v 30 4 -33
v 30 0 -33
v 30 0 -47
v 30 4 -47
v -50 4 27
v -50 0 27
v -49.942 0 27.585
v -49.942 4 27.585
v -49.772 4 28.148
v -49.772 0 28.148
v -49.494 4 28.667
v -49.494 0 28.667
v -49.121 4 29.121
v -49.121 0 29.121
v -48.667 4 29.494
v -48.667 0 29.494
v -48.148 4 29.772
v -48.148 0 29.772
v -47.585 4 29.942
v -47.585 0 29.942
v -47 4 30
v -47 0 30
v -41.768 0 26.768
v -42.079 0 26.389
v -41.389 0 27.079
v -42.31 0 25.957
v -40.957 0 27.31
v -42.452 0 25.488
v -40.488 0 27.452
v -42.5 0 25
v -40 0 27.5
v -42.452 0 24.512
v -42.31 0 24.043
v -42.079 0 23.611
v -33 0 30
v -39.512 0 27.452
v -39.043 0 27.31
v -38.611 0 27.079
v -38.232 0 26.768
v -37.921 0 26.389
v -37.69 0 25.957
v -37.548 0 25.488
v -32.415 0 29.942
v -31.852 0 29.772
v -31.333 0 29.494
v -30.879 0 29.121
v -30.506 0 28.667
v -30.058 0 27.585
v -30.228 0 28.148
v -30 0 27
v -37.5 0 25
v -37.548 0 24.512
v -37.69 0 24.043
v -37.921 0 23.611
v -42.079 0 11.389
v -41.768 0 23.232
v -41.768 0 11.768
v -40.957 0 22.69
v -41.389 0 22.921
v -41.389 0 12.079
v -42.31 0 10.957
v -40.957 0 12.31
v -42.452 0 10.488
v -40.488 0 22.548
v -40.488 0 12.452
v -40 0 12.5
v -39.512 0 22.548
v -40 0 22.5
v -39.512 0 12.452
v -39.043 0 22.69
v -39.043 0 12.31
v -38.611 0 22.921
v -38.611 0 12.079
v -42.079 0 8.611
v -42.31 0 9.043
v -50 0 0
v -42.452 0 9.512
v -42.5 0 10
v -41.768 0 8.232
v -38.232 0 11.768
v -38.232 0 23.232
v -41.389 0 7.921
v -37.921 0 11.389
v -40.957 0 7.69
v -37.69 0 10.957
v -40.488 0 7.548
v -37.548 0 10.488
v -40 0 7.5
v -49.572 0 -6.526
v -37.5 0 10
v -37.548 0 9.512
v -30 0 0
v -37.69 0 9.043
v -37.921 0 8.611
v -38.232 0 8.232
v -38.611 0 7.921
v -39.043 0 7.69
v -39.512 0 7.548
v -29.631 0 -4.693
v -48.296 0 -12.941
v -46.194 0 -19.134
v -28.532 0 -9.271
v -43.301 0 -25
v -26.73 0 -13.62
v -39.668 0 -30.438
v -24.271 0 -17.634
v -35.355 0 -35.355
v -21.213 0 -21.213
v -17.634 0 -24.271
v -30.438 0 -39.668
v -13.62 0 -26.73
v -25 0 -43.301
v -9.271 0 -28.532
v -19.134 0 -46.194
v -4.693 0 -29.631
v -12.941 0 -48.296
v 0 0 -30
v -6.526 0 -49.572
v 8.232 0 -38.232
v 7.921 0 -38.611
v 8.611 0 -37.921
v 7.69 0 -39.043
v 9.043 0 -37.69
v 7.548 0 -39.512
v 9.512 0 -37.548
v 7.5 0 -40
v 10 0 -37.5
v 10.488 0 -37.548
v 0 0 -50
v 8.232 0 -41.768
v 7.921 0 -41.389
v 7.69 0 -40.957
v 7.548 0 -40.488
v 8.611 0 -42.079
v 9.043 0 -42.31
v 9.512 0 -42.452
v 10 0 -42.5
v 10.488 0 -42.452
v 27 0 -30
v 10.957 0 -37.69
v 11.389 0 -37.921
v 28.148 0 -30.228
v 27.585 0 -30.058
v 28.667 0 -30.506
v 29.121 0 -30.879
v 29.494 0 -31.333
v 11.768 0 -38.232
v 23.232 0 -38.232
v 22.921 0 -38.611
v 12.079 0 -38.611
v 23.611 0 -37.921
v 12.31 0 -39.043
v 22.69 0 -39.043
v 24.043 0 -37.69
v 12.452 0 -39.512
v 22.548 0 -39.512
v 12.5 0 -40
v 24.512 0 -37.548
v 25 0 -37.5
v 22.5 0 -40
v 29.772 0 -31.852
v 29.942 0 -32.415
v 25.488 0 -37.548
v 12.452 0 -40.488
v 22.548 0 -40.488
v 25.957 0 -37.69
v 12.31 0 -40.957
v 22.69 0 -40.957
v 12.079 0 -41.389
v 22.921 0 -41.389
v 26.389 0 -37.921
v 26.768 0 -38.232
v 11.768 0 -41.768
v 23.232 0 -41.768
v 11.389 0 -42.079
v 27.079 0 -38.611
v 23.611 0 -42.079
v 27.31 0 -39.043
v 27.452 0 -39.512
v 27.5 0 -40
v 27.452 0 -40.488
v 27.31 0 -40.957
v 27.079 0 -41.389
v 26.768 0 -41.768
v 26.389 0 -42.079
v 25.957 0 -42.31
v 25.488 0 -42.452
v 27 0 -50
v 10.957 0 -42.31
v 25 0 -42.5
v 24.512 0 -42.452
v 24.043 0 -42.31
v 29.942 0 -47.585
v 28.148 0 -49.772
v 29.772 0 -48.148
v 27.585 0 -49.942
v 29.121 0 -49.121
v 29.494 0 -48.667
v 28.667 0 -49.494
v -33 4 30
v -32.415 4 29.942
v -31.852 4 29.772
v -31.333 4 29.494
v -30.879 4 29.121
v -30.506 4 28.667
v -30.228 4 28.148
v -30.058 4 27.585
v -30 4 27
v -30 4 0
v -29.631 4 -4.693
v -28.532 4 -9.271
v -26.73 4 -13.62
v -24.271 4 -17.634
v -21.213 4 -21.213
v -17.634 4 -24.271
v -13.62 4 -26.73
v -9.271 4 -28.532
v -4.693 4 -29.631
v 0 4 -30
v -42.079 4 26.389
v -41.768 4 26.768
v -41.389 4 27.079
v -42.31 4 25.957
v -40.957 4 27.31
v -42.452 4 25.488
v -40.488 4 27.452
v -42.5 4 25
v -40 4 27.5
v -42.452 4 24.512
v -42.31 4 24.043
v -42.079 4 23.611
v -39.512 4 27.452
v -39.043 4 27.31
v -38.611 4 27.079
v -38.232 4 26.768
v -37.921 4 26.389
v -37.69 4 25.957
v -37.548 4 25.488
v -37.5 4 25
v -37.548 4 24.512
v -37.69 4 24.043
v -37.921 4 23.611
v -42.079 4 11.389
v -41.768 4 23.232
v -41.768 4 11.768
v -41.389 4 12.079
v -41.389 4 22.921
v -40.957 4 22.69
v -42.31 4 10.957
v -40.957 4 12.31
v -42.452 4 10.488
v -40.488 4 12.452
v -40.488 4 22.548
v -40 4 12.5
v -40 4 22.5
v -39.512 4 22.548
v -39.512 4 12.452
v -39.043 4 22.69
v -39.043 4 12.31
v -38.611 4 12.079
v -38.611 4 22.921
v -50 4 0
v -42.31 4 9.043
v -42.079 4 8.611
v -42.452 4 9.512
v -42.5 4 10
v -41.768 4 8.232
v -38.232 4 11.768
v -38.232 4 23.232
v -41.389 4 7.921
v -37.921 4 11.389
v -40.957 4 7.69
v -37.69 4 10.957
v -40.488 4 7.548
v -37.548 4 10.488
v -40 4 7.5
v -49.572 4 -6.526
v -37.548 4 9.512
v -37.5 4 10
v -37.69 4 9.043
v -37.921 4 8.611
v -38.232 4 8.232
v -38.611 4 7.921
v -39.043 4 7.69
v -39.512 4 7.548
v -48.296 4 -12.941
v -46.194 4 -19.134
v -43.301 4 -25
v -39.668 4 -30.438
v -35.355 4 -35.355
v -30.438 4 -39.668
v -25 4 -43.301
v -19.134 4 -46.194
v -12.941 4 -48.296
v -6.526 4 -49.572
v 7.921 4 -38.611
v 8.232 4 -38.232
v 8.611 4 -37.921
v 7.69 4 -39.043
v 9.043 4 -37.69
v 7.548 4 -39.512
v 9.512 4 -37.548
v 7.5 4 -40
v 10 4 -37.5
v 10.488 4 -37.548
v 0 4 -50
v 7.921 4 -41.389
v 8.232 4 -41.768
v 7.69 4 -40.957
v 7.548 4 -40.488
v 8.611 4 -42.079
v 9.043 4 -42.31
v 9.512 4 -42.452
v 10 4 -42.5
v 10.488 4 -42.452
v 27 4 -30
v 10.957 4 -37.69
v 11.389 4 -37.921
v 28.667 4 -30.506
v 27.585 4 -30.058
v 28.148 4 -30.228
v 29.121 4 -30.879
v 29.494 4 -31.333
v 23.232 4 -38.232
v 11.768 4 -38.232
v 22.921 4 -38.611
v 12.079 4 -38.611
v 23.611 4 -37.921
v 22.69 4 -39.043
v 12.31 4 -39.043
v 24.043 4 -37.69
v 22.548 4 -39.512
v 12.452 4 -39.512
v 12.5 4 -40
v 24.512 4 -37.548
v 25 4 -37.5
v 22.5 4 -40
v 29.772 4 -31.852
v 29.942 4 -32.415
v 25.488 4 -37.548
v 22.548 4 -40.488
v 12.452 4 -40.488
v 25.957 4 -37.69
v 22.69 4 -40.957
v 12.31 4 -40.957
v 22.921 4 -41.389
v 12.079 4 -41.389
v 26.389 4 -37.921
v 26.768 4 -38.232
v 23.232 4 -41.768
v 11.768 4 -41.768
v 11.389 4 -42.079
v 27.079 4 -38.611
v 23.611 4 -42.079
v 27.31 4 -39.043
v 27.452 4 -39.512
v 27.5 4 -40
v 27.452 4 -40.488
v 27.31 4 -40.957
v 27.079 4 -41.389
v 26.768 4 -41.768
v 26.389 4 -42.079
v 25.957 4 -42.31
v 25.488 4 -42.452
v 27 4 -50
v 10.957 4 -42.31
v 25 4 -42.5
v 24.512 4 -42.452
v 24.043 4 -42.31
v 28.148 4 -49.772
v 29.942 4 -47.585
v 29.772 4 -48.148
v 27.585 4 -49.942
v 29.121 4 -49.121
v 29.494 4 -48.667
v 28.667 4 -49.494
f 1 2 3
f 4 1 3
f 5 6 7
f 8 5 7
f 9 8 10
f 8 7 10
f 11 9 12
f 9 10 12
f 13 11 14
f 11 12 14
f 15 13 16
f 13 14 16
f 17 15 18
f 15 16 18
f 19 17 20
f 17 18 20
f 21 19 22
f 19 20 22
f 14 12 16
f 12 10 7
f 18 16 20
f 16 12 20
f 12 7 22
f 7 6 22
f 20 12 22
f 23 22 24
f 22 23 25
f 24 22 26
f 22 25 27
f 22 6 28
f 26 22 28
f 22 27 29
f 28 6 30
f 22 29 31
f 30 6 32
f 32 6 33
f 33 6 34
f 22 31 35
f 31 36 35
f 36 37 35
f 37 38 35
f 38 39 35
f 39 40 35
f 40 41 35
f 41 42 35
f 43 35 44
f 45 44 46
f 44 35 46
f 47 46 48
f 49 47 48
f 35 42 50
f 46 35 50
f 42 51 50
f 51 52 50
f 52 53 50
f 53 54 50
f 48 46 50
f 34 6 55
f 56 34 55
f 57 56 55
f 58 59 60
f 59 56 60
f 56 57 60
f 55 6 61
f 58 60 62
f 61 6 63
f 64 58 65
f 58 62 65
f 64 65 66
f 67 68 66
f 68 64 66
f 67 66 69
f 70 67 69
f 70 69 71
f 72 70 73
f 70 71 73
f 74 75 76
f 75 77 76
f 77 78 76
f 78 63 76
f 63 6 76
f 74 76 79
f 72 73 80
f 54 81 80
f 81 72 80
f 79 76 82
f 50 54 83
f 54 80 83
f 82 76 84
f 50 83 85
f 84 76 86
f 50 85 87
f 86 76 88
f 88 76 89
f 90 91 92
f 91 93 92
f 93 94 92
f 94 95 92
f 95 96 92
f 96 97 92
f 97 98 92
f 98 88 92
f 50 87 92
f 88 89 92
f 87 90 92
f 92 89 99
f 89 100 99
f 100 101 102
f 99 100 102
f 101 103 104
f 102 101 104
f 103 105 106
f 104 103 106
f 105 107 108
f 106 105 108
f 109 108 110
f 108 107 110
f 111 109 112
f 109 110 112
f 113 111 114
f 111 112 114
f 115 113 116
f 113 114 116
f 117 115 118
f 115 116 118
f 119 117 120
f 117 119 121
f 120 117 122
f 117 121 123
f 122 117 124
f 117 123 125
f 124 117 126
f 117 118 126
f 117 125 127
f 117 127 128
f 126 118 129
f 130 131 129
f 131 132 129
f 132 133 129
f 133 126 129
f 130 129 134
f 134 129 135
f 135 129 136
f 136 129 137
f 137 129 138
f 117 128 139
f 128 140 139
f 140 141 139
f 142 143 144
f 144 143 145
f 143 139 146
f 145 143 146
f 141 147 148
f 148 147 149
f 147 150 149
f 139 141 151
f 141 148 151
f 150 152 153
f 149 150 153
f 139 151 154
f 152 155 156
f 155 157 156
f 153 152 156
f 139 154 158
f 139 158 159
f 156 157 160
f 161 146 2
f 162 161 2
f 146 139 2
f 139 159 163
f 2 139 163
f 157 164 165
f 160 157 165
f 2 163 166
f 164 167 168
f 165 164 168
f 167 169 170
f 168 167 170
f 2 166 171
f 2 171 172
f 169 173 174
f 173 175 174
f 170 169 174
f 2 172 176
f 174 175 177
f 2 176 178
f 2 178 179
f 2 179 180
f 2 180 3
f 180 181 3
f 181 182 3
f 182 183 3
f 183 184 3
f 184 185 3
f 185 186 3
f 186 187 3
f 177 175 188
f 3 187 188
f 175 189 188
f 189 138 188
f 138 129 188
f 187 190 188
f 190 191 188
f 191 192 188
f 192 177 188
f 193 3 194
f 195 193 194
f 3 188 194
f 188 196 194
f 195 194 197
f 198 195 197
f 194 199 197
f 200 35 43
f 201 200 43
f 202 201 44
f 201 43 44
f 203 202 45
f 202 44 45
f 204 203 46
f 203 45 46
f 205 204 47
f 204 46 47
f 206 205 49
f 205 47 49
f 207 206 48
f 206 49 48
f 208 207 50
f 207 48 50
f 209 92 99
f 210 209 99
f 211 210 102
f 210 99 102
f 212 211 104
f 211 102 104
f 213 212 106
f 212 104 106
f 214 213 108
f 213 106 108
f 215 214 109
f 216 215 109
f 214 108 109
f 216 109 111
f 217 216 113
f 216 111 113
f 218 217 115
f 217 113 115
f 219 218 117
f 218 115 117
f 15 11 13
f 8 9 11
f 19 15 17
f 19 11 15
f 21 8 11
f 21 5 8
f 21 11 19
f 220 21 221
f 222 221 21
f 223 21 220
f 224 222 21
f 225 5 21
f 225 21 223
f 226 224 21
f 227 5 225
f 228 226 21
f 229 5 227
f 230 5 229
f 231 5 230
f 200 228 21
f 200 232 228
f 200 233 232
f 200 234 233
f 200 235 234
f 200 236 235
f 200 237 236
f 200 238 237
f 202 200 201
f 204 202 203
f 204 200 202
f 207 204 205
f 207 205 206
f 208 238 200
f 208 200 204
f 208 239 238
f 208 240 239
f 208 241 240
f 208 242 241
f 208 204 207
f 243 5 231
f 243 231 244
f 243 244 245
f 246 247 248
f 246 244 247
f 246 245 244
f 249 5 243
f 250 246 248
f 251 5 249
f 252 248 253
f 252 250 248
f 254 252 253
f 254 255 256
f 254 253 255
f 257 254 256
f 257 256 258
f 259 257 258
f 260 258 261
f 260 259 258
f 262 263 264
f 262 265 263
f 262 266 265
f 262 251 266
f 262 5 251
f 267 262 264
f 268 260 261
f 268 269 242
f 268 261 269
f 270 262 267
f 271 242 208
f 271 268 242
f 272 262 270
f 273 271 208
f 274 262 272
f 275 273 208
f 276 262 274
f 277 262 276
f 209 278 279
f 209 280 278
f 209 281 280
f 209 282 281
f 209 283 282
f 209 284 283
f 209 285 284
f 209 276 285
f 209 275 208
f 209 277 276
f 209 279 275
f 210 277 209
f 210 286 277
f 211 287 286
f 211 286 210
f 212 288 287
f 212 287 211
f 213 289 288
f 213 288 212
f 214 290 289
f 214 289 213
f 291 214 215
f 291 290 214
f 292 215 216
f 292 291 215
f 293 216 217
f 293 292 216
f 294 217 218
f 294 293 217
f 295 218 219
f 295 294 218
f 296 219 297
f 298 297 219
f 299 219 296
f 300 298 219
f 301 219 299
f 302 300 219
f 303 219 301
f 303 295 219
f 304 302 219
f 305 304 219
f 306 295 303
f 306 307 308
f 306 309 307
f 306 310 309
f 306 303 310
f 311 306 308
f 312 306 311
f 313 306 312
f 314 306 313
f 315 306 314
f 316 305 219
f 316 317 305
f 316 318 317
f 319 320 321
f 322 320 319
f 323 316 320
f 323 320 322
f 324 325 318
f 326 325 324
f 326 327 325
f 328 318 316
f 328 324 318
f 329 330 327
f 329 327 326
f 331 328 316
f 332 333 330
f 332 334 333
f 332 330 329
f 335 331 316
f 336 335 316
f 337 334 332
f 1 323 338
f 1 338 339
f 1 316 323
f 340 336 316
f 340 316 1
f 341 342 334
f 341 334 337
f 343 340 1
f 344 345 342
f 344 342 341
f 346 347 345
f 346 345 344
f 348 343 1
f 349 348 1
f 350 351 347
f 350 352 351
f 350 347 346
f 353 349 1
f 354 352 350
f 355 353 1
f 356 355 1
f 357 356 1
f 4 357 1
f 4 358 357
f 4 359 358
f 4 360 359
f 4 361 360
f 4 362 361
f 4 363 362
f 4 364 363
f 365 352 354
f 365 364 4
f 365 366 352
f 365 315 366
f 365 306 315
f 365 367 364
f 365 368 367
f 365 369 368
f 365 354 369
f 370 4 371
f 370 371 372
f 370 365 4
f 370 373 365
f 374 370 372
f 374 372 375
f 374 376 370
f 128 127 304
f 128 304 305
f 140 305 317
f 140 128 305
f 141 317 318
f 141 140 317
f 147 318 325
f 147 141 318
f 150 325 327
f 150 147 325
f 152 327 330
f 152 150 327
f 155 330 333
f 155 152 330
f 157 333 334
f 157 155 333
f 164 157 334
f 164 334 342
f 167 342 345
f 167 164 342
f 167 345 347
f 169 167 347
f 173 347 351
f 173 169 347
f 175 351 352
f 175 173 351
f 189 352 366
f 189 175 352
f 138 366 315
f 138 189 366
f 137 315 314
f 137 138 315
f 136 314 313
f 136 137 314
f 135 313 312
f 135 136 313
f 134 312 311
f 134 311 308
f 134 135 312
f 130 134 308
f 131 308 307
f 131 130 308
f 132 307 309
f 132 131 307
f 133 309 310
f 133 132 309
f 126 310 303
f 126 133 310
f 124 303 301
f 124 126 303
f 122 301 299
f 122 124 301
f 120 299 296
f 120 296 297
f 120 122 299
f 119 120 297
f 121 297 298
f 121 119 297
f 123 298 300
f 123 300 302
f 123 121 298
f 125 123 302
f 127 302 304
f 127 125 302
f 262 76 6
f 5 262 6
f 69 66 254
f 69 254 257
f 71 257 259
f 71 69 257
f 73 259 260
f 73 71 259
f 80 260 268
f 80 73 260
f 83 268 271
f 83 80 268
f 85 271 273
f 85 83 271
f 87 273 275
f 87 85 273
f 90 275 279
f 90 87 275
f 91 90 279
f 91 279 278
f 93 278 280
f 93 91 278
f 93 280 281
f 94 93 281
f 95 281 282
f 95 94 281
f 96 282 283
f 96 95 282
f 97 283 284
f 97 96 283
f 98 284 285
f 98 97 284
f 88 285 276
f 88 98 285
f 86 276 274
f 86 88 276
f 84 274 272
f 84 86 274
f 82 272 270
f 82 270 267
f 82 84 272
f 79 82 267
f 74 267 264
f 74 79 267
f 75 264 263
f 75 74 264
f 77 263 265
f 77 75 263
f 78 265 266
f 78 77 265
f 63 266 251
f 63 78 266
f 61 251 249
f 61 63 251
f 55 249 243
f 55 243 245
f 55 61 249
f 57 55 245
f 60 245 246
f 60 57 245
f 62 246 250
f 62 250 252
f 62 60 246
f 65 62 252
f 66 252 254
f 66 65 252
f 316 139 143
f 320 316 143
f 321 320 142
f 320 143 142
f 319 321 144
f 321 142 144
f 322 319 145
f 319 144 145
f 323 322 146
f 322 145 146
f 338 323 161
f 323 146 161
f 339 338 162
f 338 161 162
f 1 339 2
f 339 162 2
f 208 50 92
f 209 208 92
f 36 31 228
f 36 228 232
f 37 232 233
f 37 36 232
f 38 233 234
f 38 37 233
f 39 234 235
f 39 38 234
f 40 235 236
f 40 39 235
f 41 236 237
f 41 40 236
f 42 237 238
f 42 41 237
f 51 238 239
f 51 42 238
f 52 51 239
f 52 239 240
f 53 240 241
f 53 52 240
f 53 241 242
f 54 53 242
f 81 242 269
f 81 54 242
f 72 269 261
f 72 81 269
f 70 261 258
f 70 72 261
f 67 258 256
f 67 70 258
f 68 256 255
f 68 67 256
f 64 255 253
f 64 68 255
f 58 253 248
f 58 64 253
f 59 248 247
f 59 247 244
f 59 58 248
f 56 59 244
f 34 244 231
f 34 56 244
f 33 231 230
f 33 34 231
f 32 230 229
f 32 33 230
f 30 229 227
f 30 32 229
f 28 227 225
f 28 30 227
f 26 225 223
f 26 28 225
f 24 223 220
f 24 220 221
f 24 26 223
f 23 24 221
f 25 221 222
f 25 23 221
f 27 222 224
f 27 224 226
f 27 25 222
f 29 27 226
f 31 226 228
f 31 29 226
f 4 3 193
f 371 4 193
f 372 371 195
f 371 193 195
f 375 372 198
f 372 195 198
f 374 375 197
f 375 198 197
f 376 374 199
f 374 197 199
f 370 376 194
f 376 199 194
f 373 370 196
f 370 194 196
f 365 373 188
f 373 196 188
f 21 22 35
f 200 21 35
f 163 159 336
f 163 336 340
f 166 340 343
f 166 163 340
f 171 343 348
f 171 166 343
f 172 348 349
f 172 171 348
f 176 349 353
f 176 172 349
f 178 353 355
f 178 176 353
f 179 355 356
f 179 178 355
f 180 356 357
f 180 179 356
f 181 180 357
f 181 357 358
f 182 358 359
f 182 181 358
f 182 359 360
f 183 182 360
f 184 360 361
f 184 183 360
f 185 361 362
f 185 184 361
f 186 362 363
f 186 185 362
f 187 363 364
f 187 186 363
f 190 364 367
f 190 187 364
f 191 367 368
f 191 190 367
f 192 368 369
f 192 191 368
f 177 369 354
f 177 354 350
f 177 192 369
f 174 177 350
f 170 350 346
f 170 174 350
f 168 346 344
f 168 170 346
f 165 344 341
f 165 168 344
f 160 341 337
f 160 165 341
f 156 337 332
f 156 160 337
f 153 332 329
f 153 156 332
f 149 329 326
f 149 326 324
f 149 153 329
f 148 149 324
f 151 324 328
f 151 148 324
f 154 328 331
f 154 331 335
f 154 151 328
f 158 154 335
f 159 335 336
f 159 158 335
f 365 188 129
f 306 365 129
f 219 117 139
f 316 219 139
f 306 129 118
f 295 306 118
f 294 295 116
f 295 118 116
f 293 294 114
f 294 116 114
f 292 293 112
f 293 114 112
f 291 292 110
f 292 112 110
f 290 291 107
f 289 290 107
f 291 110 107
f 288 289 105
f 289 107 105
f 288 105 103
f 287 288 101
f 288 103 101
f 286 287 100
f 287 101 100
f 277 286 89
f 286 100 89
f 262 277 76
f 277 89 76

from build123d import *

# Parameters (mm, degrees)
SKETCH1_R           = 2.5
BOSS_EXTRUDE1_DEPTH = 4


with BuildPart() as part:
    # Sketch1 → Boss-Extrude1 (new body)
    with BuildSketch(Plane(origin=(0, 0, 0), x_dir=(1, 0, 0), z_dir=(0, 1, 0))):
        with BuildLine():
            Line((-50, 0), (-50, -27))
            ThreePointArc((-50, -27), (-49.121320344, -29.121320344), (-47, -30))
            Line((-47, -30), (-33, -30))
            ThreePointArc((-33, -30), (-30.878679656, -29.121320344), (-30, -27))
            Line((-30, -27), (-30, -14.142135624))
            Line((-30, -14.142135624), (-30, 0))
            ThreePointArc((-30, 0), (-21.213203436, 21.213203436), (0, 30))
            Line((0, 30), (14.142135624, 30))
            Line((14.142135624, 30), (27, 30))
            ThreePointArc((27, 30), (29.121320344, 30.878679656), (30, 33))
            Line((30, 33), (30, 47))
            ThreePointArc((30, 47), (29.121320344, 49.121320344), (27, 50))
            Line((27, 50), (0, 50))
            ThreePointArc((0, 50), (-35.355339059, 35.355339059), (-50, 0))
        make_face()
        with Locations(Location((-40, -10, 0), (0, 0, 270))):
            Circle(SKETCH1_R, mode=Mode.SUBTRACT)
        with Locations(Location((-40, -25, 0), (0, 0, 270))):
            Circle(SKETCH1_R, mode=Mode.SUBTRACT)
        with Locations(Location((10, 40, 0), (0, 0, 270))):
            Circle(SKETCH1_R, mode=Mode.SUBTRACT)
        with Locations(Location((25, 40, 0), (0, 0, 270))):
            Circle(SKETCH1_R, mode=Mode.SUBTRACT)
    extrude(amount=BOSS_EXTRUDE1_DEPTH)


solid = part.part
